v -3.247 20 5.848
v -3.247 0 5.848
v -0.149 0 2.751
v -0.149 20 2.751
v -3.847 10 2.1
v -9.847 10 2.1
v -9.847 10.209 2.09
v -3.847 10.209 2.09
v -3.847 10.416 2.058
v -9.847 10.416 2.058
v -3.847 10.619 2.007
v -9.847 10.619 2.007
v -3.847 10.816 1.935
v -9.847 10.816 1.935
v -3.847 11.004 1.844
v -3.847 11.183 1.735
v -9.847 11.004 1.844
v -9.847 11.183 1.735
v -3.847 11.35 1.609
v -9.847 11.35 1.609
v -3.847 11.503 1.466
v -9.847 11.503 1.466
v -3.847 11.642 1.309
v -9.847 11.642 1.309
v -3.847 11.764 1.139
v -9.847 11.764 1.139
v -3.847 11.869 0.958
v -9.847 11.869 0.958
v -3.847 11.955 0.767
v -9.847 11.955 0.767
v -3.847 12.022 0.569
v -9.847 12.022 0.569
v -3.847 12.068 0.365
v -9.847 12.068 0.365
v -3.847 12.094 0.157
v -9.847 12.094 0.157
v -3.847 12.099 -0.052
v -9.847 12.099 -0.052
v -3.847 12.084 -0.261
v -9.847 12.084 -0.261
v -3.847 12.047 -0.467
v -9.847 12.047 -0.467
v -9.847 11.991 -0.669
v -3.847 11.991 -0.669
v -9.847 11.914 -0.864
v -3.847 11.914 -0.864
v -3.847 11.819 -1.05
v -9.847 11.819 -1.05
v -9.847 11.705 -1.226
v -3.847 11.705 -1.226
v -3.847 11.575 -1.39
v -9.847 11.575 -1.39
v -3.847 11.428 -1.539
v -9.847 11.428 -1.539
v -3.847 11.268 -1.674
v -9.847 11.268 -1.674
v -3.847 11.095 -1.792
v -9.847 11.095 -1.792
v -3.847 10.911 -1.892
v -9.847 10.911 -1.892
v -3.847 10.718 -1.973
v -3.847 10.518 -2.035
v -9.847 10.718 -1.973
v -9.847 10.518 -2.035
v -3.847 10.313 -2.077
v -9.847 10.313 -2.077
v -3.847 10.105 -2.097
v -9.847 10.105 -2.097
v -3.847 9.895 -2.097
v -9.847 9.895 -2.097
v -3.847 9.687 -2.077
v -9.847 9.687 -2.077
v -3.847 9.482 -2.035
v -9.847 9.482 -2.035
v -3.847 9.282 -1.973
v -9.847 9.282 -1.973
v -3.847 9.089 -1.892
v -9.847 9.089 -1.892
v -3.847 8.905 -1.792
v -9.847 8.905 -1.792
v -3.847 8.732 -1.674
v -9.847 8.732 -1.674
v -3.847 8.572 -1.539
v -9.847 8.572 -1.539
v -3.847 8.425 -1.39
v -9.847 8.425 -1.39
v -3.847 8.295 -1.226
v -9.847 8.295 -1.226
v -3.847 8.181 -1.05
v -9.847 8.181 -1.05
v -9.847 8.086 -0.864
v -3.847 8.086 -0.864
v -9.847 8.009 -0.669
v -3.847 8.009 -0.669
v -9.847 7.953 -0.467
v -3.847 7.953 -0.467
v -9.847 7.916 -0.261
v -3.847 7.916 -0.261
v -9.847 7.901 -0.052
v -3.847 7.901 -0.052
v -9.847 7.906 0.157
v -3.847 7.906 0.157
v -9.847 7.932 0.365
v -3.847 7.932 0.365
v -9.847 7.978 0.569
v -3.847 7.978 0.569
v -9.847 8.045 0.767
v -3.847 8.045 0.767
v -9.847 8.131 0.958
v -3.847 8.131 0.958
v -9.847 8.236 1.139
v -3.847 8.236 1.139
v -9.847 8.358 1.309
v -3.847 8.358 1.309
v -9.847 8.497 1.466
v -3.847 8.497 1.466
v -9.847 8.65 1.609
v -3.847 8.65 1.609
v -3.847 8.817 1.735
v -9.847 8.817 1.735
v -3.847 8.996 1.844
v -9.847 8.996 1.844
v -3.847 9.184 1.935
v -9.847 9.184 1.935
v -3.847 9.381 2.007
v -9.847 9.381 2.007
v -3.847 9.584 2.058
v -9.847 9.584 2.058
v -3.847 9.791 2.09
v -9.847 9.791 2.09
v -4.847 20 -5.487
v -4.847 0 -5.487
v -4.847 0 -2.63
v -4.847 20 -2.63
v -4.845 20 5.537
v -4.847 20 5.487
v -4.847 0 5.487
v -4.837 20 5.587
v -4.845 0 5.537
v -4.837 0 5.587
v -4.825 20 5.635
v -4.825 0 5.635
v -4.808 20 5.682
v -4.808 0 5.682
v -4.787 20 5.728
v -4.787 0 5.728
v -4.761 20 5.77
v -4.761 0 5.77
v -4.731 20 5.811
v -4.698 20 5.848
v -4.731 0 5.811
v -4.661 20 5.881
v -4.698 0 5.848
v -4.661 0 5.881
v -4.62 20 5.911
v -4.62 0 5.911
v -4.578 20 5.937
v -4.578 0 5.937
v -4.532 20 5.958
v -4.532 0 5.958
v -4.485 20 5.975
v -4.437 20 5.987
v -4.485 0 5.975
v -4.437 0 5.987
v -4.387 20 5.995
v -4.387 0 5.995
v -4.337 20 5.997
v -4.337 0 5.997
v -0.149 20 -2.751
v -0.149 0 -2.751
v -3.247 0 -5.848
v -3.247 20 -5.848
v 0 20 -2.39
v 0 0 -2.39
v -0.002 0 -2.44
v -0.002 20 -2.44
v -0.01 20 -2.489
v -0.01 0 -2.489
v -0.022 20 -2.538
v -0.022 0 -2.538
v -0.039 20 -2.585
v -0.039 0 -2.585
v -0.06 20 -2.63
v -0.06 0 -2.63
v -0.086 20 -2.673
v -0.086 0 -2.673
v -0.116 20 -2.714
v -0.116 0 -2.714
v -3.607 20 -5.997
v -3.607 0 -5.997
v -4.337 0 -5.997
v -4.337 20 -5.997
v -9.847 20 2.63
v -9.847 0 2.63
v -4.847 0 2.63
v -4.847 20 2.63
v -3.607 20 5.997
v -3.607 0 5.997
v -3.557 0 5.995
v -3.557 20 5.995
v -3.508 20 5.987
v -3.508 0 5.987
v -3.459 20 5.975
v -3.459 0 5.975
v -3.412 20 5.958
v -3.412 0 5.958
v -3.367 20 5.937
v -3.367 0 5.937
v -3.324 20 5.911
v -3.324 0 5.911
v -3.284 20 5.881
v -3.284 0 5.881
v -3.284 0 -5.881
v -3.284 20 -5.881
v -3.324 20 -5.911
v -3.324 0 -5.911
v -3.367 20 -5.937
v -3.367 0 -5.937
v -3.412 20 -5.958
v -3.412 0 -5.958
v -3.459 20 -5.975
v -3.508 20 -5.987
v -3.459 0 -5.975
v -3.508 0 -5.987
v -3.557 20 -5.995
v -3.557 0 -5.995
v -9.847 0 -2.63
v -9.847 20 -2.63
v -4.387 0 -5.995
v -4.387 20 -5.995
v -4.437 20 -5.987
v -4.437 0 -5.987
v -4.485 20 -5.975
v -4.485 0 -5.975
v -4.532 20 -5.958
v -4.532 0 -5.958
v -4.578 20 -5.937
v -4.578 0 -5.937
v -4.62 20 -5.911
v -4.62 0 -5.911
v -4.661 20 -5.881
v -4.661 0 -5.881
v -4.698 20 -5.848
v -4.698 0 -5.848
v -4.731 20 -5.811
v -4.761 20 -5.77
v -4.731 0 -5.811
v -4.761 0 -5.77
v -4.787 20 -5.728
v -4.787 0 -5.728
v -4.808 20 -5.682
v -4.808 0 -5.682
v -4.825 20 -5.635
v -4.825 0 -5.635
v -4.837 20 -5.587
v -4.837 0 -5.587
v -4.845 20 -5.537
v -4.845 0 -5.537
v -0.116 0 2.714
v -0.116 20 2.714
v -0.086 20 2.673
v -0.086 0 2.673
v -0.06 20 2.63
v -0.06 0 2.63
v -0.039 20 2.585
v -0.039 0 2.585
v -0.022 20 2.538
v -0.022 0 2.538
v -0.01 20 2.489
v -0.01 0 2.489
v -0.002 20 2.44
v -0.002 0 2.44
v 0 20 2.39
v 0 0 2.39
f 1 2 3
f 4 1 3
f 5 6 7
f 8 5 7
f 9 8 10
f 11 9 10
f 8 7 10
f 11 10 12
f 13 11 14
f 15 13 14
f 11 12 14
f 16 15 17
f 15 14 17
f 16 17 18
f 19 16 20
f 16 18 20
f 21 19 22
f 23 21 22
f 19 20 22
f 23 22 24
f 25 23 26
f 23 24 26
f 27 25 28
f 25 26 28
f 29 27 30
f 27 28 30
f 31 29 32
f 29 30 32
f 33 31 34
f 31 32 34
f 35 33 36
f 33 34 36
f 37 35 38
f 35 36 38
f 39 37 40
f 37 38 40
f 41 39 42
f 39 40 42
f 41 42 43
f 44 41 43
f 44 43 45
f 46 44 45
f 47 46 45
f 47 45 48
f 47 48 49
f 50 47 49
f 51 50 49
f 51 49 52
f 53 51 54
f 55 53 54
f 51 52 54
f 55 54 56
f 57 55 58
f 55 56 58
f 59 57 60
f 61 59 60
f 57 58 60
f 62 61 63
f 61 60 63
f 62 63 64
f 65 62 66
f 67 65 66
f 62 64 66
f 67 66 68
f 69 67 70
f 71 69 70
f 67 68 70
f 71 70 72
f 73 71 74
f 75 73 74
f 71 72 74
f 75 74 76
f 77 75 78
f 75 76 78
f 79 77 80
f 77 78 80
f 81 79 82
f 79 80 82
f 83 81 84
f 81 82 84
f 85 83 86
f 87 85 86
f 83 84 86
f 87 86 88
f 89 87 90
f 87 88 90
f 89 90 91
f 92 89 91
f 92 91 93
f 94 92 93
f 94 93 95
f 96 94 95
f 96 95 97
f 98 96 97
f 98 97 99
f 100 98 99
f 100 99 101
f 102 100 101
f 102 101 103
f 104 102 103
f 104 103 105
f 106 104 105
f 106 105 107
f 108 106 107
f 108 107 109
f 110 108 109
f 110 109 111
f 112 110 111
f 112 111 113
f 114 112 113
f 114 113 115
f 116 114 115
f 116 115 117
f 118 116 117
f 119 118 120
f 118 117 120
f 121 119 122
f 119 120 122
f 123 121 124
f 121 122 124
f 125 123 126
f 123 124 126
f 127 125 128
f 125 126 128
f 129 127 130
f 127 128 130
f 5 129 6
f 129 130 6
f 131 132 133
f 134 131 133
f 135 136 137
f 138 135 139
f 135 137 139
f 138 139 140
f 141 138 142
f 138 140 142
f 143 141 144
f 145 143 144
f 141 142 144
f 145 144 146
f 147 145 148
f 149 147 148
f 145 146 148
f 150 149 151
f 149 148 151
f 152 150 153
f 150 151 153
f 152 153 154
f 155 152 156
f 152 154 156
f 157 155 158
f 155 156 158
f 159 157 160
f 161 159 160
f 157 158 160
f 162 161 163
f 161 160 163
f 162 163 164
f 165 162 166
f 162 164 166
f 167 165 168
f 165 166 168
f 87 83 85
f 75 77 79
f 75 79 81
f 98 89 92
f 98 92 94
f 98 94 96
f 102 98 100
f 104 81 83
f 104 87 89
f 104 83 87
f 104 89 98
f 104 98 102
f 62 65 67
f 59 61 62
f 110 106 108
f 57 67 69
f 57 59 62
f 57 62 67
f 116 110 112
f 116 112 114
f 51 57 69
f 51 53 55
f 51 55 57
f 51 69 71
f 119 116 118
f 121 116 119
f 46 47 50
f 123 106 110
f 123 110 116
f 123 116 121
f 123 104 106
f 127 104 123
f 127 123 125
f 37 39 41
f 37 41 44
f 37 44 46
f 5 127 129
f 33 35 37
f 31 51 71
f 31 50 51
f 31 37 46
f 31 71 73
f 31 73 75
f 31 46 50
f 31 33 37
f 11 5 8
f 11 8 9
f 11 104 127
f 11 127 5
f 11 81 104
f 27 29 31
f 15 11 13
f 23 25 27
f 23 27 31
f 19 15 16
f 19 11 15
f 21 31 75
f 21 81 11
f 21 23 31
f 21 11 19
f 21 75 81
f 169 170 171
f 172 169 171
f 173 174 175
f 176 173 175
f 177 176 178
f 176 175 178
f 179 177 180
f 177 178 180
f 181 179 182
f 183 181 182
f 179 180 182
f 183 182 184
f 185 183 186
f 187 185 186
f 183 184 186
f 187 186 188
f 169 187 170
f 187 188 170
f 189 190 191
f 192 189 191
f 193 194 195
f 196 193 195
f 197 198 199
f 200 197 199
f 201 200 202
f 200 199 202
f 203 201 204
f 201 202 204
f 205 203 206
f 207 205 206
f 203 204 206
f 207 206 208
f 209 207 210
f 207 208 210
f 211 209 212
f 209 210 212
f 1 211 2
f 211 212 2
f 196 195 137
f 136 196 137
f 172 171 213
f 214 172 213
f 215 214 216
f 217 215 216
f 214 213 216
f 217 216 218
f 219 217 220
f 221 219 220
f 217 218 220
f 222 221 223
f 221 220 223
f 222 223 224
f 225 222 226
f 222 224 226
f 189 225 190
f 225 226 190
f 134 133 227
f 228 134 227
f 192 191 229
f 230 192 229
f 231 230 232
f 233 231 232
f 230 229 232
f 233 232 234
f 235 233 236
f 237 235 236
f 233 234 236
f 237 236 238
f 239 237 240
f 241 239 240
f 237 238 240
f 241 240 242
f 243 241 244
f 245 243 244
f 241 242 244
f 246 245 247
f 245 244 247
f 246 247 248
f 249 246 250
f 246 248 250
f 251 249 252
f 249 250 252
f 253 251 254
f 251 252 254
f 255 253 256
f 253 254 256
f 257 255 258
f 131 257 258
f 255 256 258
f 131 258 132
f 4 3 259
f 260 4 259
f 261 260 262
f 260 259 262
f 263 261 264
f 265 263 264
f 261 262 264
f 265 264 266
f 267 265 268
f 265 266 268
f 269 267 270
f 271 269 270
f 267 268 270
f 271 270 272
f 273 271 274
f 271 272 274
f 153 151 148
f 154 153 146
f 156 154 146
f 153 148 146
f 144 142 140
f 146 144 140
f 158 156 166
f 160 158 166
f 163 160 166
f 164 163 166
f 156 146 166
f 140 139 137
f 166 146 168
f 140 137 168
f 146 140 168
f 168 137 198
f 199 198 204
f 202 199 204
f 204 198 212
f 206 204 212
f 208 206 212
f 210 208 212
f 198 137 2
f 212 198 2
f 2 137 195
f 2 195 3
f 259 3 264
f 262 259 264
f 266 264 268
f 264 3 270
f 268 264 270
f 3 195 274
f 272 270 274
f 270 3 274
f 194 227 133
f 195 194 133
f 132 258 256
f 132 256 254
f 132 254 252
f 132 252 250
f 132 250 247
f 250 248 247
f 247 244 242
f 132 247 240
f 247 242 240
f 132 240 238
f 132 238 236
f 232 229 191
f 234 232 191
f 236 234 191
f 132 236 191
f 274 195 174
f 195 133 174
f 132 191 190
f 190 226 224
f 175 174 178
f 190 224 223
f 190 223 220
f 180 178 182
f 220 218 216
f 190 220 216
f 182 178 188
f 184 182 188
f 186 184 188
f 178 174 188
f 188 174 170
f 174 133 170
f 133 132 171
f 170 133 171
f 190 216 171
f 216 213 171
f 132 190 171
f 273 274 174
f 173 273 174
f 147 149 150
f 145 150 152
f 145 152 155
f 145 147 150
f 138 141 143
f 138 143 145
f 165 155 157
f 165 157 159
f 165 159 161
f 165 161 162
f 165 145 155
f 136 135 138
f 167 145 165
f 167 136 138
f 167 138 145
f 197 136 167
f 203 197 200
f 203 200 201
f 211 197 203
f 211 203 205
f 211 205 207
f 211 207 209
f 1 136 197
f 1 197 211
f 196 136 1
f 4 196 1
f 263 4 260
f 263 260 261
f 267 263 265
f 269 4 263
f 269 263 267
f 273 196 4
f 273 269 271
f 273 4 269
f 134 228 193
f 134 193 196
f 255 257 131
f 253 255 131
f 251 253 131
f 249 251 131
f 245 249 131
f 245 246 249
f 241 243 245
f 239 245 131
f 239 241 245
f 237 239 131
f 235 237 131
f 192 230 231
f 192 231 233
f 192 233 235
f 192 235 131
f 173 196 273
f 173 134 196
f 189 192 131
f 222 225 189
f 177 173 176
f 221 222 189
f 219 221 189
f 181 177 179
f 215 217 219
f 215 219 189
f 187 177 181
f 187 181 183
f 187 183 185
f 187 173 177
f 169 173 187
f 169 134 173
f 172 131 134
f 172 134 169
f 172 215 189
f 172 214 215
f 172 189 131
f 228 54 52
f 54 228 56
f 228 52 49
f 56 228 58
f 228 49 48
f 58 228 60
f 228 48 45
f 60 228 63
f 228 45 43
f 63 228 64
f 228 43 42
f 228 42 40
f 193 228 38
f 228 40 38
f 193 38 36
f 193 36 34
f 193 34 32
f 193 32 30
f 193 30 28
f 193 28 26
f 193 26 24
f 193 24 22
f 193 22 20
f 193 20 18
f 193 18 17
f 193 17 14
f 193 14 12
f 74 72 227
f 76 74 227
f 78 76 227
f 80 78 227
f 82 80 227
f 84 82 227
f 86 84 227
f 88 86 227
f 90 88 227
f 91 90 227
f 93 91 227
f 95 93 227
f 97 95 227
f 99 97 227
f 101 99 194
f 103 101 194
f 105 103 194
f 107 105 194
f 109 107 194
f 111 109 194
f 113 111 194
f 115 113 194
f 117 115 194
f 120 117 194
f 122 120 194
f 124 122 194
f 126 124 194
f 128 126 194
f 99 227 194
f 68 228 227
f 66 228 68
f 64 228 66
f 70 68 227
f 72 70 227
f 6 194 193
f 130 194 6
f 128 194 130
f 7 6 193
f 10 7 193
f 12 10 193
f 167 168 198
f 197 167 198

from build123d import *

# Parameters (mm, degrees)
BOSS_EXTRUDE1_DEPTH = 20
SKETCH2_R           = 2.1
CUT_EXTRUDE1_DEPTH  = 6


with BuildPart() as part:
    # Sketch1 → Boss-Extrude1 (new body)
    with BuildSketch(Plane(origin=(0, 0, 0), x_dir=(1, 0, 0), z_dir=(0, 1, 0))):
        with BuildLine():
            Line((-4.847127702, 5.487127702), (-4.847127702, 2.63))
            Line((-4.847127702, 2.63), (-9.847127702, 2.63))
            Line((-9.847127702, 2.63), (-9.847127702, -2.63))
            Line((-9.847127702, -2.63), (-4.847127702, -2.63))
            Line((-4.847127702, -2.63), (-4.847127702, -5.487127702))
            ThreePointArc((-4.847127702, -5.487127702), (-4.69775216, -5.84775216), (-4.337127702, -5.997127702))
            Line((-4.337127702, -5.997127702), (-3.607127702, -5.997127702))
            ThreePointArc((-3.607127702, -5.997127702), (-3.411959151, -5.958306263), (-3.246503243, -5.84775216))
            Line((-3.246503243, -5.84775216), (-0.149375542, -2.750624458))
            ThreePointArc((-0.149375542, -2.750624458), (-0.038821438, -2.585168551), (0, -2.39))
            Line((0, -2.39), (0, 2.39))
            ThreePointArc((0, 2.39), (-0.038821438, 2.585168551), (-0.149375542, 2.750624458))
            Line((-0.149375542, 2.750624458), (-3.246503243, 5.84775216))
            ThreePointArc((-3.246503243, 5.84775216), (-3.411959151, 5.958306263), (-3.607127702, 5.997127702))
            Line((-3.607127702, 5.997127702), (-4.337127702, 5.997127702))
            ThreePointArc((-4.337127702, 5.997127702), (-4.69775216, 5.84775216), (-4.847127702, 5.487127702))
        make_face()
    extrude(amount=BOSS_EXTRUDE1_DEPTH)

    # Sketch2 → Cut-Extrude1 (cut)
    with BuildSketch(Plane.ZY.offset(9.847127702)):
        with Locations((0, 10)):
            Circle(SKETCH2_R)
    extrude(amount=-CUT_EXTRUDE1_DEPTH, mode=Mode.SUBTRACT)


solid = part.part
